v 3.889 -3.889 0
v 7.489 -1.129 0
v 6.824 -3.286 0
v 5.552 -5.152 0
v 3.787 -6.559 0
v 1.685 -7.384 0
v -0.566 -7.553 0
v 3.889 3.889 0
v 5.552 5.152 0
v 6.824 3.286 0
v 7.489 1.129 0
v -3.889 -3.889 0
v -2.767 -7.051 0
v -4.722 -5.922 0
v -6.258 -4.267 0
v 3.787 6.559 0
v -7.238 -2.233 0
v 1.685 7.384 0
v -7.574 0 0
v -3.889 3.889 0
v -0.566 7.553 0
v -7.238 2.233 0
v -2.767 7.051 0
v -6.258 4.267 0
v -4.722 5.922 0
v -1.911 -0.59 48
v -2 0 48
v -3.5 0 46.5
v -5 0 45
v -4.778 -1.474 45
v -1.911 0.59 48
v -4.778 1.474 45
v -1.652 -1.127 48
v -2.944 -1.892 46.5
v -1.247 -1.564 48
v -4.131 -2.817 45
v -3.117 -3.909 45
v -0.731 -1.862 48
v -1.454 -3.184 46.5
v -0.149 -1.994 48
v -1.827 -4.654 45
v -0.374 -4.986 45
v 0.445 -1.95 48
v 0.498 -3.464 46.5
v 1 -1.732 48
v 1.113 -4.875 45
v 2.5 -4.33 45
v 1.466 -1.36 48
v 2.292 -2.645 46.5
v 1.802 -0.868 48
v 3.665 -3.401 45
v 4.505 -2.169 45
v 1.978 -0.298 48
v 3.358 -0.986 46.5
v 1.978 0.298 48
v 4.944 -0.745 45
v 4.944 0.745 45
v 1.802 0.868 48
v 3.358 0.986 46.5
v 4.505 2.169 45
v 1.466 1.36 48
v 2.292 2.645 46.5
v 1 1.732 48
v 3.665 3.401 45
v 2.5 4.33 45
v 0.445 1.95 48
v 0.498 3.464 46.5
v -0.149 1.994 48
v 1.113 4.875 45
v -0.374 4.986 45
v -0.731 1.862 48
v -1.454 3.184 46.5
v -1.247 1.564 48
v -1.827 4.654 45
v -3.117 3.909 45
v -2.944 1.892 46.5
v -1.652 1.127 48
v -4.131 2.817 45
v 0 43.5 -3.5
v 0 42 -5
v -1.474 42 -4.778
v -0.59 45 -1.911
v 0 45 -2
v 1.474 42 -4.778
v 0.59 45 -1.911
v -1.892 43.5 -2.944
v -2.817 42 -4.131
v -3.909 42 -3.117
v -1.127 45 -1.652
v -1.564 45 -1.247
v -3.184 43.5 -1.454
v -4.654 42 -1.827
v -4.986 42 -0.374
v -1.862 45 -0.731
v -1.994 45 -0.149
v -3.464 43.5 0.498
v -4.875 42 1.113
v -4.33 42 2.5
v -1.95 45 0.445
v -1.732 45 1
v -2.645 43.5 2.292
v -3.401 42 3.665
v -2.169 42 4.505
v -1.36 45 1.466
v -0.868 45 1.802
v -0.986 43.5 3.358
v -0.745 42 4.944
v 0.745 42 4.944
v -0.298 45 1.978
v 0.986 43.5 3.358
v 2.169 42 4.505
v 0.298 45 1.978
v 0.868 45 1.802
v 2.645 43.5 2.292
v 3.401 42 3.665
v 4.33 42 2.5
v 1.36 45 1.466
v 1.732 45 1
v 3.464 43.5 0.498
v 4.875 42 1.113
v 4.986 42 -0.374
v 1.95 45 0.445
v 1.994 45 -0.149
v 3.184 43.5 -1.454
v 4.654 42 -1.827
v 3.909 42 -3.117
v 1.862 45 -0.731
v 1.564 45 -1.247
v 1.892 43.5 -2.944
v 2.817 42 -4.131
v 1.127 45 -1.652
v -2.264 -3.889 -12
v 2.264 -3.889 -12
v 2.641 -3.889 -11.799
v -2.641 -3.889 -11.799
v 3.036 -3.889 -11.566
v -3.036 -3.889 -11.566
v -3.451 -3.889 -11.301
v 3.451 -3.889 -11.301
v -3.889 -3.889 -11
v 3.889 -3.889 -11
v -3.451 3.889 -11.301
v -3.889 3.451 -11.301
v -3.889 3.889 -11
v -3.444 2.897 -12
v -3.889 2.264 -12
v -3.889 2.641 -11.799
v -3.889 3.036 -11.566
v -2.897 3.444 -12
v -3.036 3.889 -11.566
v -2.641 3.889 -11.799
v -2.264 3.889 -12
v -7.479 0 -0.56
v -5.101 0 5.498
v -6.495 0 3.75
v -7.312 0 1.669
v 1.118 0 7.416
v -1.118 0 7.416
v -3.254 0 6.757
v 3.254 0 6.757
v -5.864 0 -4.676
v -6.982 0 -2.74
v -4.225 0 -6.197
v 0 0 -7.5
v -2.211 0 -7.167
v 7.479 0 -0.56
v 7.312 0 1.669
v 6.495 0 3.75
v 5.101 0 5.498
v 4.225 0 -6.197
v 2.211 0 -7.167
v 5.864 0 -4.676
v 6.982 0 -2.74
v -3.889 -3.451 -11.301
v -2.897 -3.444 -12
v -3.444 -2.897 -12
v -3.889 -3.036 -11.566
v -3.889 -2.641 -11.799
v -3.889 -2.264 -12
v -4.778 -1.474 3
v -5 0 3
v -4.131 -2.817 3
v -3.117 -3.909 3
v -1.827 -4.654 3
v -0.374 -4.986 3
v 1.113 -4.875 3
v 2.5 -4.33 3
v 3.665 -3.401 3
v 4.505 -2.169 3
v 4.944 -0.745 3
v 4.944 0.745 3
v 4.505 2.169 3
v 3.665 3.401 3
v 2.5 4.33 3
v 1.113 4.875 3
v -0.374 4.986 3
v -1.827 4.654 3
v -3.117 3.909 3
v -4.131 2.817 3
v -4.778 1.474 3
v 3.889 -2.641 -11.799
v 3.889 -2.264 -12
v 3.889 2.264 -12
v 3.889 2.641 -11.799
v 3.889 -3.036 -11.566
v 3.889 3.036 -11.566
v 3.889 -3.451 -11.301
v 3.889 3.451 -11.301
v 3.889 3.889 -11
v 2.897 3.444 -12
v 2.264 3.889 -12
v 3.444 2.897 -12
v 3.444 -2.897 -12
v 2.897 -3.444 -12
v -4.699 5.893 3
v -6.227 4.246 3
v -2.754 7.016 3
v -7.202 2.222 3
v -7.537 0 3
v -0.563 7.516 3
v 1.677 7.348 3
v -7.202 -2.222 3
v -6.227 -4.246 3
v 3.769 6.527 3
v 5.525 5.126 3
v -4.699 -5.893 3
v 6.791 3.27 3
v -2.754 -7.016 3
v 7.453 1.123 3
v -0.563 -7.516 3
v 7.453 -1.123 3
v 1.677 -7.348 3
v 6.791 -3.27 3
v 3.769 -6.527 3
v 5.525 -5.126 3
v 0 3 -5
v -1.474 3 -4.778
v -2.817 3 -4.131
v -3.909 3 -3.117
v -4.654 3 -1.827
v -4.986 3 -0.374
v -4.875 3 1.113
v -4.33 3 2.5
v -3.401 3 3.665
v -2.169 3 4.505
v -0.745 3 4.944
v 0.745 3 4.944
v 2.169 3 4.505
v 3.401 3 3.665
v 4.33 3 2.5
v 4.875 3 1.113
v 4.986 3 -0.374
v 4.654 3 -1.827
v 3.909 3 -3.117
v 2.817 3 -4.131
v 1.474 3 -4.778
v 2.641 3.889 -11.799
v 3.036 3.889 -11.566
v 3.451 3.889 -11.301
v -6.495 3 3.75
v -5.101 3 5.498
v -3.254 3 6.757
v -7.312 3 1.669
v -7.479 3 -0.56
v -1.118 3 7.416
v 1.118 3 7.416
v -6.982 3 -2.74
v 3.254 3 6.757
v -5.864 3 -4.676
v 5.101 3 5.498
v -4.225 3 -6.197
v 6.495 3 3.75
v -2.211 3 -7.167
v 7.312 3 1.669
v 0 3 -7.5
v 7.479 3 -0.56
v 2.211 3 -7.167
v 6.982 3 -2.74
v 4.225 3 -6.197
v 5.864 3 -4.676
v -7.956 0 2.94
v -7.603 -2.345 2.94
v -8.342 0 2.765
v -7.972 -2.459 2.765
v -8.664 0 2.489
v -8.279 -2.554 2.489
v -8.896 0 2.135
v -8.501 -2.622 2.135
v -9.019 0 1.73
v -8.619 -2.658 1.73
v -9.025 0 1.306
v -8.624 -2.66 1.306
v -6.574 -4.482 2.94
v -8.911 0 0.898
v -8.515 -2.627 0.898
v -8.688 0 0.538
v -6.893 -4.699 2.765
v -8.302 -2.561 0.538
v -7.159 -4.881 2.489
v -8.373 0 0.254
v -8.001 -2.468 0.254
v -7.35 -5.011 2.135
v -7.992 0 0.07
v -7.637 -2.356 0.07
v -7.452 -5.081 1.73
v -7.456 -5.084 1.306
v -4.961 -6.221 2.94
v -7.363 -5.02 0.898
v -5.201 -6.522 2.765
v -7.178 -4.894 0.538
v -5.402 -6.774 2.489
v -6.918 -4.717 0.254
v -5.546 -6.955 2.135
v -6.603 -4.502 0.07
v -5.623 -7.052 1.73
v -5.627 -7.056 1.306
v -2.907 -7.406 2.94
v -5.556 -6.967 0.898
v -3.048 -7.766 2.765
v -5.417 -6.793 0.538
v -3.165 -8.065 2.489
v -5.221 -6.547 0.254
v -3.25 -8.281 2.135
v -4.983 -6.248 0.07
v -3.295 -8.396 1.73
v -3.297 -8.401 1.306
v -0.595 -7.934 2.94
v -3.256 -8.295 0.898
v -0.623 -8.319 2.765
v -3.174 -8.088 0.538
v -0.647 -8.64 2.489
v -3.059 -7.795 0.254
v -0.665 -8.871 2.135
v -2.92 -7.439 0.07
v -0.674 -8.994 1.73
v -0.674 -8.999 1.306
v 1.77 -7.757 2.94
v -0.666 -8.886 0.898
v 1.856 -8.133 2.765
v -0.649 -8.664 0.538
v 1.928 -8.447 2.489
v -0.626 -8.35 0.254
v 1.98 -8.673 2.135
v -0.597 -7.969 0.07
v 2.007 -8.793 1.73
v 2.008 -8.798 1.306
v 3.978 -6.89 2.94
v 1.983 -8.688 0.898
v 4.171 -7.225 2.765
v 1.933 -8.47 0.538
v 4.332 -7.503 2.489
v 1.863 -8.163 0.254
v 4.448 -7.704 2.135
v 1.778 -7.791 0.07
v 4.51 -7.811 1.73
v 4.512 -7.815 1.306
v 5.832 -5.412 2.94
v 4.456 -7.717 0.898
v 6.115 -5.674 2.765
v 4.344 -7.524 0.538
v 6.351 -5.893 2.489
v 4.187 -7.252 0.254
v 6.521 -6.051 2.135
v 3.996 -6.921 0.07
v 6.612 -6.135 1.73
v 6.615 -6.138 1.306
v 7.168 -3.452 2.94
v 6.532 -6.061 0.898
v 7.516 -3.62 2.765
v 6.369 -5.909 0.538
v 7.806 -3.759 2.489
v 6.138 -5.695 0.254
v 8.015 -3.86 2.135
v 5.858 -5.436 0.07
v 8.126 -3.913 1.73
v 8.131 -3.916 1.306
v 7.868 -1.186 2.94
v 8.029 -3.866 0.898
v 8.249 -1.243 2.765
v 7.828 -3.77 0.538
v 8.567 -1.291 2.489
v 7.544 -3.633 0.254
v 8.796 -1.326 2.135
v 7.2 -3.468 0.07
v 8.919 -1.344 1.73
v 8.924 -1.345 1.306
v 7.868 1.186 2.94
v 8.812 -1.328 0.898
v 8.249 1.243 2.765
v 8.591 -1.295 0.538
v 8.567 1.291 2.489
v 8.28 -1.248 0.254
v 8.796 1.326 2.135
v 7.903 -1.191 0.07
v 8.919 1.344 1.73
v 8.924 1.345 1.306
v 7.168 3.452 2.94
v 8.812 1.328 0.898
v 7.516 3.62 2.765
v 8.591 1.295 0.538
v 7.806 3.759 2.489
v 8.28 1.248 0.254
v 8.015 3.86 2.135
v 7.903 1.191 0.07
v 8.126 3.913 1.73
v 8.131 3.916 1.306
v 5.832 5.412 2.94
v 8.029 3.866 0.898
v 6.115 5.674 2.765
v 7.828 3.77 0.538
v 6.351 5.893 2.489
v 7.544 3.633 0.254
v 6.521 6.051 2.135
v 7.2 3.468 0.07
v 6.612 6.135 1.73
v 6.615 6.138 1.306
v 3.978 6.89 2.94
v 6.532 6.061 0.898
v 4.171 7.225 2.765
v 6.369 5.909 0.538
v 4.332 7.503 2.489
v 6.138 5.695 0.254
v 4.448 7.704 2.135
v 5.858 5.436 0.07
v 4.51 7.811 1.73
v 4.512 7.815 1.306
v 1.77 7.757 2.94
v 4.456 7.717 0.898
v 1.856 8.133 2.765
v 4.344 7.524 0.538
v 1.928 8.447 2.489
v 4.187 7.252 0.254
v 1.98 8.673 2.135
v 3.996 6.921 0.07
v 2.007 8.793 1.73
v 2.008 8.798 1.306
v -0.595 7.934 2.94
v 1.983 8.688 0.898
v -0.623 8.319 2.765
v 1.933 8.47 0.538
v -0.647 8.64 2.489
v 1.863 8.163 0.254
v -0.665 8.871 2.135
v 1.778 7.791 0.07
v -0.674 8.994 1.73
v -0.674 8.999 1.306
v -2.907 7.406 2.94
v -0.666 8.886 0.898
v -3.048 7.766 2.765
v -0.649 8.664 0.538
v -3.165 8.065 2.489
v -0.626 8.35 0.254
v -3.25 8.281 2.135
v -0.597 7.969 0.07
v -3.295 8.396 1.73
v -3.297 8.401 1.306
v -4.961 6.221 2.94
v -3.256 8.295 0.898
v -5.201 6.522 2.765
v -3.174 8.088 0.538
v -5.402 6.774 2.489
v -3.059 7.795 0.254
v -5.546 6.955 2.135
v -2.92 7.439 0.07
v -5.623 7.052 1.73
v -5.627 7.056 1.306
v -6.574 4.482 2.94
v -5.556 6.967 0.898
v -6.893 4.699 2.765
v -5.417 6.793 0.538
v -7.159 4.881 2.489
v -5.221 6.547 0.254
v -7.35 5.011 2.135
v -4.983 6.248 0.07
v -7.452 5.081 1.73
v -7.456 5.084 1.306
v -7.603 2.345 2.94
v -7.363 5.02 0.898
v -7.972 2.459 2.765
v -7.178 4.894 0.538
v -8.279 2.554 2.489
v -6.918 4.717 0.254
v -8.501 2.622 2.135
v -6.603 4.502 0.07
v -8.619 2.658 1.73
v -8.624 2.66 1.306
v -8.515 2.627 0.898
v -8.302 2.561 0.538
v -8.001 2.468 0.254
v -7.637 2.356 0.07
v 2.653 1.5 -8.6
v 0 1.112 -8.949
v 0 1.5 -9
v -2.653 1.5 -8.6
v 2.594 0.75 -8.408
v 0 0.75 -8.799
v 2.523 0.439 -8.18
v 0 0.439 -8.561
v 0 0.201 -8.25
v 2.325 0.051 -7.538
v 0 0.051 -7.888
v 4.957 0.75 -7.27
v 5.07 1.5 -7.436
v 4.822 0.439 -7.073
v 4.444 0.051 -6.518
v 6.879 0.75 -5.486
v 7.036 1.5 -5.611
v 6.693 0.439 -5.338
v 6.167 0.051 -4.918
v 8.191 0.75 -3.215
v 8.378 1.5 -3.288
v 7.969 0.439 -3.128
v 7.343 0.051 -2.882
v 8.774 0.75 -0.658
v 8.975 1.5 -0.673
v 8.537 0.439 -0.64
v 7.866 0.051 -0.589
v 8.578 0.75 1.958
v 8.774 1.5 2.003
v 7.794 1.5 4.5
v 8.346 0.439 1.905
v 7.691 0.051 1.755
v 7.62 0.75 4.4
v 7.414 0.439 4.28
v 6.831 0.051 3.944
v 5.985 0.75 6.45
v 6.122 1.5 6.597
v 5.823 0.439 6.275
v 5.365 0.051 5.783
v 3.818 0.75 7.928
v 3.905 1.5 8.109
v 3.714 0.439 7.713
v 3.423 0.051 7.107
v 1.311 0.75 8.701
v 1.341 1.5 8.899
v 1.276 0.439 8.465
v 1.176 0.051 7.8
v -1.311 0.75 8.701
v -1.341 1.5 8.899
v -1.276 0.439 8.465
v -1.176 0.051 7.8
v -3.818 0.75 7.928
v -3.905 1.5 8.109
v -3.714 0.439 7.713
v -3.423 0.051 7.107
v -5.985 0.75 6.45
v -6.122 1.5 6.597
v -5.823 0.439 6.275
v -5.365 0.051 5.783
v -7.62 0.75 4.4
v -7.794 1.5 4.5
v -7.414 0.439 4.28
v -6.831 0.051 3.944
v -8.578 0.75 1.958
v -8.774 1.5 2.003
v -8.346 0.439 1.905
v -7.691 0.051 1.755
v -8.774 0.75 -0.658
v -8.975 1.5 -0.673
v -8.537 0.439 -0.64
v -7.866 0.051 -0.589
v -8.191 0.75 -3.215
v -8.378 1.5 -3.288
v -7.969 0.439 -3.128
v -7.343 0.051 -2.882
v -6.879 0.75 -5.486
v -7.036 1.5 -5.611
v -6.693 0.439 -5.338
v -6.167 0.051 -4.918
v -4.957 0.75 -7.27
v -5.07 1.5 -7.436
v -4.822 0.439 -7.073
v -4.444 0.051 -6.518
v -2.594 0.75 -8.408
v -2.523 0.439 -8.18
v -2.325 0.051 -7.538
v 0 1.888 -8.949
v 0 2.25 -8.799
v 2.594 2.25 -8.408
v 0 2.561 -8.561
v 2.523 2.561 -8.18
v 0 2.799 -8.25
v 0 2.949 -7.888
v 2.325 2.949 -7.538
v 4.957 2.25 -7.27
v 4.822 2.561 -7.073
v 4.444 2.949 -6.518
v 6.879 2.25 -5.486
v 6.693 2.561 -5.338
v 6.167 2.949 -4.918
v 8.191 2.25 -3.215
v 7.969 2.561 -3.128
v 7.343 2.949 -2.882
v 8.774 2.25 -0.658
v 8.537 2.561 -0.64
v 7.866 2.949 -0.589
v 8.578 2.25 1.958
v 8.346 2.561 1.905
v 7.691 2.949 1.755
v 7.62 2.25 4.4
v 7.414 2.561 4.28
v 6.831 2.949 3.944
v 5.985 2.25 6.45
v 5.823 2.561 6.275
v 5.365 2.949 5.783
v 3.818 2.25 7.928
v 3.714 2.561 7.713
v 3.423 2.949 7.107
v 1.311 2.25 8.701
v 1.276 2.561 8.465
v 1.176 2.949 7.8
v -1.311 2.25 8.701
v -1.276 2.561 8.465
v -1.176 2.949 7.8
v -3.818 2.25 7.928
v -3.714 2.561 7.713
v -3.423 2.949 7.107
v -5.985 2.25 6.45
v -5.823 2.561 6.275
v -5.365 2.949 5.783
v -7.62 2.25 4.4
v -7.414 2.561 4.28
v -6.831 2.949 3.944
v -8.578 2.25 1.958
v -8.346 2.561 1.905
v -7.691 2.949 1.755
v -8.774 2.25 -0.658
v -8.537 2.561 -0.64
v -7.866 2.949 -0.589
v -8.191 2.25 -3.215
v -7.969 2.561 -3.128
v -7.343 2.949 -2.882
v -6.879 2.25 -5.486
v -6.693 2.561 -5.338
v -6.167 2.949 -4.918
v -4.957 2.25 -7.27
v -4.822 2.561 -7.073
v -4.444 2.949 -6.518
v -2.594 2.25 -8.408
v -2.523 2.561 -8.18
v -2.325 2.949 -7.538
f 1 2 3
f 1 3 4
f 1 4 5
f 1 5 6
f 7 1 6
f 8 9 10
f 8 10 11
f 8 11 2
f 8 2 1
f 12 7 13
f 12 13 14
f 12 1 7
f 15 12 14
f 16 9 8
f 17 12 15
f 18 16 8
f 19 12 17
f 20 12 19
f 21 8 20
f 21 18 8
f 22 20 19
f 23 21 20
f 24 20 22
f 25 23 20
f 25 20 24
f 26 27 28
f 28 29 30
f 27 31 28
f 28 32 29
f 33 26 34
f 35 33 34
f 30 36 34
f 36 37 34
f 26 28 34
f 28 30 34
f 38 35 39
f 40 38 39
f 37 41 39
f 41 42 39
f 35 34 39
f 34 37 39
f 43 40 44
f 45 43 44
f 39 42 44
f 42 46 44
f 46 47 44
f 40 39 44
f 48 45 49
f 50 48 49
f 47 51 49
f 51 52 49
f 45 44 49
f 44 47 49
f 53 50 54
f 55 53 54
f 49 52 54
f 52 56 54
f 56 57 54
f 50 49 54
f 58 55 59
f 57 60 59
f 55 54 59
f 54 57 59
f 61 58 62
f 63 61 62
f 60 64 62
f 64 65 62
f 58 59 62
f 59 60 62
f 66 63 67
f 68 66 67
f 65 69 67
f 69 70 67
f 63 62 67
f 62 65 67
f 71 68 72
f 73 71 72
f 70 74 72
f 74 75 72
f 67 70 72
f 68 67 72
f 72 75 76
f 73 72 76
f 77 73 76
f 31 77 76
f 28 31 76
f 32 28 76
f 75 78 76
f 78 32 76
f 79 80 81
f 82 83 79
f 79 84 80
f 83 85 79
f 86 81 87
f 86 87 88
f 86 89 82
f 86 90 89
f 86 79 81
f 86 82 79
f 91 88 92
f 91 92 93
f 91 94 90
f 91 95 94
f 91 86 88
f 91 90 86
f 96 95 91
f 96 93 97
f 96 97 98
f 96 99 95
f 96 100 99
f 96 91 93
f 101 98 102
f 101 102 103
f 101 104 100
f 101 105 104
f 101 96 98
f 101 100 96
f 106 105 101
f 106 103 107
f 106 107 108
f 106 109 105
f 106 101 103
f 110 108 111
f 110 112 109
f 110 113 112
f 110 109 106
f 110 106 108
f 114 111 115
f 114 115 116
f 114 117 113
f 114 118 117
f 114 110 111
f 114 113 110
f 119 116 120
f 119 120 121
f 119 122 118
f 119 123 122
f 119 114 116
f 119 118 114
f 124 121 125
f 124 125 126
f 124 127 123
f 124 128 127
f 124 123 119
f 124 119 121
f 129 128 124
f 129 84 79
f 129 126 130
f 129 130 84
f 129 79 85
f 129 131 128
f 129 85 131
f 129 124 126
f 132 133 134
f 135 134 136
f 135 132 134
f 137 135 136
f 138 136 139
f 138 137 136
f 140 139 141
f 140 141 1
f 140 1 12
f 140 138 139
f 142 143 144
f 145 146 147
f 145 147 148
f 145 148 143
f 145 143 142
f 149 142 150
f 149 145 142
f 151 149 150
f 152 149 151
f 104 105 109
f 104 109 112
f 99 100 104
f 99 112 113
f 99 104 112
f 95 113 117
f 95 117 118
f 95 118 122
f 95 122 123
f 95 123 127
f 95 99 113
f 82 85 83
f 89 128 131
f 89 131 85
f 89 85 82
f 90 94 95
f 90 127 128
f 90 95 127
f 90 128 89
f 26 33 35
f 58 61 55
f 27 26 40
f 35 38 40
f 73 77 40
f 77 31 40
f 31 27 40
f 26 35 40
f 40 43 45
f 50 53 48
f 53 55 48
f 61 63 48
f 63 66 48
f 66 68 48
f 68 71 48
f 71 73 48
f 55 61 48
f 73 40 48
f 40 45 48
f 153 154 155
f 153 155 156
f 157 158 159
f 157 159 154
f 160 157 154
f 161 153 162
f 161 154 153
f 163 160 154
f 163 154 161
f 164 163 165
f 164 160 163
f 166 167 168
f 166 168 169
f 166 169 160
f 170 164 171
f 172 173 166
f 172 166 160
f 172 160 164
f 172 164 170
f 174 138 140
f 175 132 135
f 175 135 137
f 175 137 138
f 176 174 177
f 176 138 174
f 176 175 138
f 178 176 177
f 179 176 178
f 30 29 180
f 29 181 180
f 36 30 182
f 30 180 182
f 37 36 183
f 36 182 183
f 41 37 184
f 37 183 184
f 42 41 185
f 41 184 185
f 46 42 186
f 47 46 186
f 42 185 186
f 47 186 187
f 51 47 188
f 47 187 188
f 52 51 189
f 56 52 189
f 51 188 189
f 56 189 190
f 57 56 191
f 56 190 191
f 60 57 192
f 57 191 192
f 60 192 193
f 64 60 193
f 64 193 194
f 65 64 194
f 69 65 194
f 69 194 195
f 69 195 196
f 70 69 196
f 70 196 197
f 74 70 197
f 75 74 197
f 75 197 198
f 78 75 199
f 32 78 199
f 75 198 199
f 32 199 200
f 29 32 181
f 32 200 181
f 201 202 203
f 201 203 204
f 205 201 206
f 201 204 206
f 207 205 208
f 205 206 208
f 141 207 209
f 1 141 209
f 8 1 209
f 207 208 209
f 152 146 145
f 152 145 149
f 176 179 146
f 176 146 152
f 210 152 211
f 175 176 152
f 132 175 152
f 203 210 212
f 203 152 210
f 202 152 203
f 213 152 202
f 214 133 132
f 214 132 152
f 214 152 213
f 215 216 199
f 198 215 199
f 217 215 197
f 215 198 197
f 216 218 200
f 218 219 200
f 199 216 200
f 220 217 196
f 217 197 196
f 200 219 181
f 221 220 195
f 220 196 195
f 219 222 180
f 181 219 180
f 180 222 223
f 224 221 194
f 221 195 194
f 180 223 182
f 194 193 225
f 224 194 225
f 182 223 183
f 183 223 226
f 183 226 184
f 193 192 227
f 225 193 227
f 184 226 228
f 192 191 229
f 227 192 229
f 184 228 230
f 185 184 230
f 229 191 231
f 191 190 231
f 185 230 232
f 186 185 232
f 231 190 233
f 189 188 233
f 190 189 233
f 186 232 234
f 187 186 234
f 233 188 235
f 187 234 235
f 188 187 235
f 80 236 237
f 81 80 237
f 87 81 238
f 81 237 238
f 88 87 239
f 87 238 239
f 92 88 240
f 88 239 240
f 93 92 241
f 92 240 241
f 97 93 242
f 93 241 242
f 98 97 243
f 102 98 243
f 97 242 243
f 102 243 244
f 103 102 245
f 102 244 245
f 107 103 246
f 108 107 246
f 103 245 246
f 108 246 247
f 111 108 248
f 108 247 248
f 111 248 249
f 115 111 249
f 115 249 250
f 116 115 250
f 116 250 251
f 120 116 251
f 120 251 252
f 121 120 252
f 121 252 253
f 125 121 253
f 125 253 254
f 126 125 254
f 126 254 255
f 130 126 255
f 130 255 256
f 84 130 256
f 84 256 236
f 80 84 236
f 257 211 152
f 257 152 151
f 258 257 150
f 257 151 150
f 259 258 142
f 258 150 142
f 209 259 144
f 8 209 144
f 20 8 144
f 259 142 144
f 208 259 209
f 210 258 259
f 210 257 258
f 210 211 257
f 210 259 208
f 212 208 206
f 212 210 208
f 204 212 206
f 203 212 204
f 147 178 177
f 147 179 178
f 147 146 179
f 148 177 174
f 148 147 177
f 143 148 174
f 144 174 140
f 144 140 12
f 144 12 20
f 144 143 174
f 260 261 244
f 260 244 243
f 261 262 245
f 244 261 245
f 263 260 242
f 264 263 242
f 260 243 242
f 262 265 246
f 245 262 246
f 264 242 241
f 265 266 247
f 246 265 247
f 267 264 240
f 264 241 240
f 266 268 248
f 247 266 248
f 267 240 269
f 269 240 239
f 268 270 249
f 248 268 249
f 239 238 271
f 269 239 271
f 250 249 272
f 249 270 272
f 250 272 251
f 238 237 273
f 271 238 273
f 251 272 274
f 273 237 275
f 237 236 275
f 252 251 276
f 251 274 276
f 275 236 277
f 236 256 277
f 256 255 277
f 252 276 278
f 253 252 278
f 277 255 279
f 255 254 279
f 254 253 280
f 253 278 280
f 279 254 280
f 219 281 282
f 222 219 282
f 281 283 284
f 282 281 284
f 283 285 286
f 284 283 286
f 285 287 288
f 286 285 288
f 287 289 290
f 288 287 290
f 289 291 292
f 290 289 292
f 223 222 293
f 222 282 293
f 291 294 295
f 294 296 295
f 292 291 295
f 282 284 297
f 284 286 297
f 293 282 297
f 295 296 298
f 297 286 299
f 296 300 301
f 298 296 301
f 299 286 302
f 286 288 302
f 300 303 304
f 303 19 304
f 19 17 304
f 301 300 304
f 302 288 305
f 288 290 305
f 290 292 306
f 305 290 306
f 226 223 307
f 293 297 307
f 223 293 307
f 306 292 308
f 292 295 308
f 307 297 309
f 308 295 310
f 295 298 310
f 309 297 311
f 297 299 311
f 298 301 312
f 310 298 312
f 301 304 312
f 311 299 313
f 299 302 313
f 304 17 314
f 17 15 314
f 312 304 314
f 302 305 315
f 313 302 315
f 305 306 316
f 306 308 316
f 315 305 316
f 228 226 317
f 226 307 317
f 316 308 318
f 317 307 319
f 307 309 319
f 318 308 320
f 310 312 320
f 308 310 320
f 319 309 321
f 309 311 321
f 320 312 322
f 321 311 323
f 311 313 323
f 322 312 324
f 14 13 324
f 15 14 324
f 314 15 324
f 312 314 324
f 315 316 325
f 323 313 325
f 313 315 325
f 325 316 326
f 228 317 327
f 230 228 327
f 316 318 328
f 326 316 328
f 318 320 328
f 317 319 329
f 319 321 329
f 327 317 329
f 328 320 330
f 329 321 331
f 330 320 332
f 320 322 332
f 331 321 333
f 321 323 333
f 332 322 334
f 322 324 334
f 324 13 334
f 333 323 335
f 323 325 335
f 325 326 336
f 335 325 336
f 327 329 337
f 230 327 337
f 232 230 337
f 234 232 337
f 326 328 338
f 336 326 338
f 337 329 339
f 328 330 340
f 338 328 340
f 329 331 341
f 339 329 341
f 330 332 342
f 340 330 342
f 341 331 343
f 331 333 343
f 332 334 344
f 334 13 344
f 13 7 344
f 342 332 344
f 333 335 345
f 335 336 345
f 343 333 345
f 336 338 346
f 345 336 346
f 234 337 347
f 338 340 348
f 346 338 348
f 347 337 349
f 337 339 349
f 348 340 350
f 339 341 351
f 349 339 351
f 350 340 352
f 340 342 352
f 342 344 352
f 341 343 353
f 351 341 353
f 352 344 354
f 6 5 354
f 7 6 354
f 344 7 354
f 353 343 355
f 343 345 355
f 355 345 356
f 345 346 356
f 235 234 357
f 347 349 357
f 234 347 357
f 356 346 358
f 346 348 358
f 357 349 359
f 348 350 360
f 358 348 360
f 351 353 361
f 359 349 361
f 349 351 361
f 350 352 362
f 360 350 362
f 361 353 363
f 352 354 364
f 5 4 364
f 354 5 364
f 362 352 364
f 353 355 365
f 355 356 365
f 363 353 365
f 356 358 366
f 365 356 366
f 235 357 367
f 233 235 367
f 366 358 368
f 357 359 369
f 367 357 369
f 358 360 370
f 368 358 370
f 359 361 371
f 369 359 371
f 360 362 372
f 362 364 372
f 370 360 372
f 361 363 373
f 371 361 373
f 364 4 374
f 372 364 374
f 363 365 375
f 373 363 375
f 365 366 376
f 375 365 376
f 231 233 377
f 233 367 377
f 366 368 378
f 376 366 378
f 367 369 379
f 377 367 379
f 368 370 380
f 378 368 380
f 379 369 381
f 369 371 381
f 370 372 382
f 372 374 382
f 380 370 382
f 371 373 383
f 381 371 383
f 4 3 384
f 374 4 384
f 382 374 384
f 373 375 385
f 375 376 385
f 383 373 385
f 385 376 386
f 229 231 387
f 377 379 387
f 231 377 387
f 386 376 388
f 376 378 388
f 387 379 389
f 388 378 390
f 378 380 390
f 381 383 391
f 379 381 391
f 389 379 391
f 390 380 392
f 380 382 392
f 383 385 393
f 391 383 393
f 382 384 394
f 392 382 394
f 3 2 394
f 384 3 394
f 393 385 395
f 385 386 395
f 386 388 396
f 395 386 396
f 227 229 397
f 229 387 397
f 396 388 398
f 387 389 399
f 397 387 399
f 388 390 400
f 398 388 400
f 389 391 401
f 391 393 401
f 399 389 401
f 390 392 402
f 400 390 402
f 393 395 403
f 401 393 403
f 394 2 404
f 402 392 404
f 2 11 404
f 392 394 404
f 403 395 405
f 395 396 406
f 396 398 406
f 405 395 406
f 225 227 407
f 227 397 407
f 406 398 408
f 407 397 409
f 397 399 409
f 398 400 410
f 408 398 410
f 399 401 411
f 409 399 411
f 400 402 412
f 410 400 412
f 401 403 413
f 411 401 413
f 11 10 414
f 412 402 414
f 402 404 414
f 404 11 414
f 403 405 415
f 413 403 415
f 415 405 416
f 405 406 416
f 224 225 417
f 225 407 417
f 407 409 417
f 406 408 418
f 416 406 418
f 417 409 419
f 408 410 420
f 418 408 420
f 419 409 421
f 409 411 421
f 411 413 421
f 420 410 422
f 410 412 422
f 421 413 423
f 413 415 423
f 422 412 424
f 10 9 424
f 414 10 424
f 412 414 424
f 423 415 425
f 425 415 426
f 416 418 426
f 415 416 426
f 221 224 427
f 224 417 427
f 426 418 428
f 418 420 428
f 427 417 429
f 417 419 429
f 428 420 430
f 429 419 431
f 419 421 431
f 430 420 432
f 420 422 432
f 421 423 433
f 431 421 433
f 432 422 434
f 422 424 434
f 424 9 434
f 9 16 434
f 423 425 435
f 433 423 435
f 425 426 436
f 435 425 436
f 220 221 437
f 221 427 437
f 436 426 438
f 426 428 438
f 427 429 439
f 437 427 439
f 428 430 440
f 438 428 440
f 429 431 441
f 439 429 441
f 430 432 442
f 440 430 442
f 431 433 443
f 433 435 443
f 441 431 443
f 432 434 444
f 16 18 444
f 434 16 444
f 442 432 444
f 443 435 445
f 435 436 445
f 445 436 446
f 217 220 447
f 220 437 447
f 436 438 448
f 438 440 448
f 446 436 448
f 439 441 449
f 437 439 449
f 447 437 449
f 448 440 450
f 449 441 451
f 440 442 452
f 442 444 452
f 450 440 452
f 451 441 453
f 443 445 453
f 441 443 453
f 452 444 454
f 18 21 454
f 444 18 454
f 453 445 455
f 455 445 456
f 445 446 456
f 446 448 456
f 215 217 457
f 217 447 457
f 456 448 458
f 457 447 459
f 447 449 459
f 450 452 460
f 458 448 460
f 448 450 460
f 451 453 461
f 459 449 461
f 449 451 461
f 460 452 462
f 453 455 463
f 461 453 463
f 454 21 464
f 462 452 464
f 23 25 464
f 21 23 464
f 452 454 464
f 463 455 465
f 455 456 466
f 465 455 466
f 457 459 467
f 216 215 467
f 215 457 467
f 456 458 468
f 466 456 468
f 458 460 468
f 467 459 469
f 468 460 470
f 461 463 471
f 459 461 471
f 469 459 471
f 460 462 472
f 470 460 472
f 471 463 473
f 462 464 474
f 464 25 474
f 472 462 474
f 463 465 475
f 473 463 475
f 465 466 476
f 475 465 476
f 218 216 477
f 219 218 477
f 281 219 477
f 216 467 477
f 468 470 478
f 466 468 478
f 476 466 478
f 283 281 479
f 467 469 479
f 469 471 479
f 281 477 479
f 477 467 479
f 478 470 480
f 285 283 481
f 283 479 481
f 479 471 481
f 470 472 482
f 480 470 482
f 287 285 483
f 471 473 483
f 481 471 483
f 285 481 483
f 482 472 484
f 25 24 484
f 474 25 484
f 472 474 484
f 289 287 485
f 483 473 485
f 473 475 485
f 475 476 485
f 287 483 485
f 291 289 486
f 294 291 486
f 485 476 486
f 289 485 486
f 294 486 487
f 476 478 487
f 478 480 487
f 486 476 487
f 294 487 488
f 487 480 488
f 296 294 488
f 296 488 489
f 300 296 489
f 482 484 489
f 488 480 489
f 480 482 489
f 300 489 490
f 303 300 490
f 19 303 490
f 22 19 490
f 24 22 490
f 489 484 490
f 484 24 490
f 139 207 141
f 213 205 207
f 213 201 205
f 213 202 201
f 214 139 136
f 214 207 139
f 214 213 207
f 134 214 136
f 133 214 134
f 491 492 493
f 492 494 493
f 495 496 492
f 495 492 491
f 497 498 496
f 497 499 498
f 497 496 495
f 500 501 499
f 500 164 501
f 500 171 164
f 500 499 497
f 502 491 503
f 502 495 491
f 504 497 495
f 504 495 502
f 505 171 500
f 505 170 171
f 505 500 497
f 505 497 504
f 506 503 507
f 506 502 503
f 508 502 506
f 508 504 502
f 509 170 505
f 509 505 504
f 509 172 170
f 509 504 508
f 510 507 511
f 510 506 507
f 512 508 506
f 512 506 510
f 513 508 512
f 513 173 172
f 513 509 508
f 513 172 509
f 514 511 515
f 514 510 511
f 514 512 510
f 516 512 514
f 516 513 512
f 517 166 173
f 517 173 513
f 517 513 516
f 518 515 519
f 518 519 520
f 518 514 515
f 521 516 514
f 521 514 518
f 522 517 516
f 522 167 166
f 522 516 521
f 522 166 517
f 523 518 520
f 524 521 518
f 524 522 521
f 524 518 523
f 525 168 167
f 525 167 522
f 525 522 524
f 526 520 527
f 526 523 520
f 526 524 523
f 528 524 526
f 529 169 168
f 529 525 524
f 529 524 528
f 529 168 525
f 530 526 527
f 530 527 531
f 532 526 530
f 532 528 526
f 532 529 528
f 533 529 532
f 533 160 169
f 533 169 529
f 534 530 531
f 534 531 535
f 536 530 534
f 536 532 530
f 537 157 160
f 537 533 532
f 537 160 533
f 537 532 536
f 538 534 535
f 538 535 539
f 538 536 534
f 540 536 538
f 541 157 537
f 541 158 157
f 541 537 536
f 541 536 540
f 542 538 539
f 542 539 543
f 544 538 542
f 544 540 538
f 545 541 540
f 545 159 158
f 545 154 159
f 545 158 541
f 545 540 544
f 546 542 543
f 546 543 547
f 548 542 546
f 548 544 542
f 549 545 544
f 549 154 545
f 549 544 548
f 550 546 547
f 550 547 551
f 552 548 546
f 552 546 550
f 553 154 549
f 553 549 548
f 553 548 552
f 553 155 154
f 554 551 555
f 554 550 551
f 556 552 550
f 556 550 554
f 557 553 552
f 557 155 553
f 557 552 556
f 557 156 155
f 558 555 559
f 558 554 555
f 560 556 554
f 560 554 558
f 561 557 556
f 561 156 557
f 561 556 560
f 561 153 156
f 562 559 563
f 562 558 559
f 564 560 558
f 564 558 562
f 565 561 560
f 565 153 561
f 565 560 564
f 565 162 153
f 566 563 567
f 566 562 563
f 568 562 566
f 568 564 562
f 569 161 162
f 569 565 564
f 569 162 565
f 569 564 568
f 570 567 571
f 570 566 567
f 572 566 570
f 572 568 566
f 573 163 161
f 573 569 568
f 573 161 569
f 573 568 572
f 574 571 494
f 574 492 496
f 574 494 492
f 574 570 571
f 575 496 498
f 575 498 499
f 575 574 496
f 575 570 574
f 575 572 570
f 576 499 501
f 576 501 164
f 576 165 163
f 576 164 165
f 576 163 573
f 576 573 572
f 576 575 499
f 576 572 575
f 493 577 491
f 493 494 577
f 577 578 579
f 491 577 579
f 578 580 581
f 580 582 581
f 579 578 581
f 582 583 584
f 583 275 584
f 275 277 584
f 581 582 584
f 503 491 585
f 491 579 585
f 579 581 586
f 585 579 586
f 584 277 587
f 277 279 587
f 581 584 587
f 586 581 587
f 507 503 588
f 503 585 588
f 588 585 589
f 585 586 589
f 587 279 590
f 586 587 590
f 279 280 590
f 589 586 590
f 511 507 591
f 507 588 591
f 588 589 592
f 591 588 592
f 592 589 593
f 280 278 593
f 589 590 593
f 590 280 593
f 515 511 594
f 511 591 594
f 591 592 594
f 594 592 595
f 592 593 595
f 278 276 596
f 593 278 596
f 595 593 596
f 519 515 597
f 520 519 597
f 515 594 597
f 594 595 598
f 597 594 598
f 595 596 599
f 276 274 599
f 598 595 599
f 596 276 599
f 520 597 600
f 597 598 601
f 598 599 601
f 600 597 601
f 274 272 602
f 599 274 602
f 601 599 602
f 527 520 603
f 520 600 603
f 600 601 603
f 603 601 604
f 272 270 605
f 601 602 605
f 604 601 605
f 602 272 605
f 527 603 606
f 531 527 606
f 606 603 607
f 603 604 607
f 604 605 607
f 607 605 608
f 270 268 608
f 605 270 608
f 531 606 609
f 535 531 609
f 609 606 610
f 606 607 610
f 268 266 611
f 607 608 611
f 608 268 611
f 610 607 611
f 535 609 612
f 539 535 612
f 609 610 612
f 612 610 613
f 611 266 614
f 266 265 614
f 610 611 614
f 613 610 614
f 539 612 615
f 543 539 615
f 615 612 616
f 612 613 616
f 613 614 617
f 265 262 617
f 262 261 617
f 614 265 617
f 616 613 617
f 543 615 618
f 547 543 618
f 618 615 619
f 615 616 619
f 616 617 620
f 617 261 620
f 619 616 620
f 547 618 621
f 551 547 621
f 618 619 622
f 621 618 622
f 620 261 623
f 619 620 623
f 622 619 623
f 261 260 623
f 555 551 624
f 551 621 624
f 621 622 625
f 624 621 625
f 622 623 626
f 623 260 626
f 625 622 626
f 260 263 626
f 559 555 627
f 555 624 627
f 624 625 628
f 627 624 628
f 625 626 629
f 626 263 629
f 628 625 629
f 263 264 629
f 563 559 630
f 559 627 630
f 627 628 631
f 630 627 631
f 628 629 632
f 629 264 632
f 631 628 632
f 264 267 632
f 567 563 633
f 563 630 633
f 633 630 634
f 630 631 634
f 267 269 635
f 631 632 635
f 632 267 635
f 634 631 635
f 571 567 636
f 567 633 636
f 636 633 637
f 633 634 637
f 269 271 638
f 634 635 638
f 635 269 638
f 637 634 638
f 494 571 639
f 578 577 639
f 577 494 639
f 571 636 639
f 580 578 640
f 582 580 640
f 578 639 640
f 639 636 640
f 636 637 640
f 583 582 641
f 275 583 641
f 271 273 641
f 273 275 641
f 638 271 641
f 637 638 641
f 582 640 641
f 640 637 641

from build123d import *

# Parameters (mm, degrees)
SKETCH4_R           = 5.5
BOSS_EXTRUDE3_DEPTH = 12
CHAMFER2_SIZE       = 1
SKETCH5_OUTSIDE_W   = 33.118
SKETCH5_OUTSIDE_H   = 33.118
SKETCH5_OUTSIDE_W_2 = 7.778174594
SKETCH5_OUTSIDE_H_2 = 7.778174594
CUT_EXTRUDE1_DEPTH  = 12
SKETCH1_R           = 5
BOSS_EXTRUDE1_DEPTH = 45
CHAMFER1_SIZE       = 3
SKETCH2_R           = 9
BOSS_EXTRUDE2_DEPTH = 3
FILLET1_R           = 1.5


with BuildPart() as part:
    # Sketch3 → Revolve1 (revolve)
    with BuildSketch(Plane(origin=(0, 0, 0), x_dir=(1, 0, 0), z_dir=(0, 1, 0))):
        with BuildLine():
            Line((0, 0), (0, -48))
            Line((0, -48), (-2, -48))
            Line((-2, -48), (-5, -45))
            Line((-5, -45), (-5, -2.999542577))
            Line((-5, -2.999542577), (-7.537041341, -2.999542577))
            ThreePointArc((-7.537041341, -2.999542577), (-9.036926981, -1.481020494), (-7.5, 0))
            Line((-7.5, 0), (0, 0))
        make_face()
    revolve(axis=Axis((0, 0, 0), (0, 0, 1)))

    # Sketch4 → Boss-Extrude3 (add)
    with BuildSketch(Plane(origin=(0, 0, 0), x_dir=(-1, 0, 0), z_dir=(0, 0, -1))):
        with Locations(Location((0, 0, 0), (0, 0, 180))):
            Circle(SKETCH4_R)
    extrude(amount=BOSS_EXTRUDE3_DEPTH)

    # Chamfer2
    chamfer2_edges = [part.edges().sort_by_distance(p)[0] for p in [
        (-5.5, 0, -12),
    ]]
    chamfer(chamfer2_edges, length=CHAMFER2_SIZE)

    # Sketch5 outside → Cut-Extrude1 (cut)
    with BuildSketch(Plane(origin=(0, 0, -12), x_dir=(-1, 0, 0), z_dir=(0, 0, -1))):
        Rectangle(SKETCH5_OUTSIDE_W, SKETCH5_OUTSIDE_H)
        Rectangle(SKETCH5_OUTSIDE_W_2, SKETCH5_OUTSIDE_H_2, mode=Mode.SUBTRACT)
    extrude(amount=-CUT_EXTRUDE1_DEPTH, mode=Mode.SUBTRACT)


with BuildPart() as body_2:
    # Sketch1 → Boss-Extrude1 (new body)
    with BuildSketch(Plane(origin=(0, 0, 0), x_dir=(1, 0, 0), z_dir=(0, 1, 0))):
        with Locations(Location((0, 0, 0), (0, 0, 90))):
            Circle(SKETCH1_R)
    extrude(amount=BOSS_EXTRUDE1_DEPTH)

    # Chamfer1
    chamfer1_edges = [body_2.edges().sort_by_distance(p)[0] for p in [
        (0, 45, 5),
    ]]
    chamfer(chamfer1_edges, length=CHAMFER1_SIZE)

    # Sketch2 → Boss-Extrude2 (add)
    with BuildSketch(Plane.XZ):
        with Locations(Location((0, 0, 0), (0, 0, 270))):
            Circle(SKETCH2_R)
    extrude(amount=-BOSS_EXTRUDE2_DEPTH)

    # Fillet1
    fillet1_edges = [body_2.edges().sort_by_distance(p)[0] for p in [
        (0, 3, 9),
        (0, 0, 9),
    ]]
    fillet(fillet1_edges, radius=FILLET1_R - 0.0001)  # a hair under: the kernel refuses the full size


solid = Compound([part.part, body_2.part])
